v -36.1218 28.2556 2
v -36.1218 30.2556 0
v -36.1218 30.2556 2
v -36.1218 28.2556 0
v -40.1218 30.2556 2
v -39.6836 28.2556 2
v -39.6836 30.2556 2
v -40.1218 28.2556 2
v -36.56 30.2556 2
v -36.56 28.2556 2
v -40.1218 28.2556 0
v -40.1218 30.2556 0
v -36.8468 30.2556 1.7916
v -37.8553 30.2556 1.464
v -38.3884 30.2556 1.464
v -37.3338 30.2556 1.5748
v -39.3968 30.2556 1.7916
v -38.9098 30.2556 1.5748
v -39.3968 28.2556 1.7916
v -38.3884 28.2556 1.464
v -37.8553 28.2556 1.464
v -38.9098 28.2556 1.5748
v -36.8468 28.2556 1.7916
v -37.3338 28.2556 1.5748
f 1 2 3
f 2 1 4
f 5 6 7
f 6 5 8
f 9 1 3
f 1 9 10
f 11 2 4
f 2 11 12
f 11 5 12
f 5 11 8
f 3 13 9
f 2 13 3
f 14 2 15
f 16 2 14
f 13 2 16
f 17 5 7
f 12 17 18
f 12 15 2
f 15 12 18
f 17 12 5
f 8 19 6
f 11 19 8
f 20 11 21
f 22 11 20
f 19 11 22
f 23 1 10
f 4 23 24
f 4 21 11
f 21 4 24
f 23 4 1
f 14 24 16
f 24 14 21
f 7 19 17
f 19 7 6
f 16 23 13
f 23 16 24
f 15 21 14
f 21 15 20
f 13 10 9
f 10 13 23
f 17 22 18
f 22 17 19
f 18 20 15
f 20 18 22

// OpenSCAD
difference () {
  union () {
    translate ([-38.121819219172885, 29.255592233168752, 1]) {
      cube ([4, 2, 2], center=true);
    }
  }
  union () {
    translate ([-38.121819219172885, 30.255592233168752, 4]) {
      rotate (a=90.0, v=[1, 0, 0]) {
        cylinder ($fn=30, h=20, r=2.55, center=true);
      }
    }
    translate ([-38.121819219172885, 28.255592233168752, 2]) {
      cube ([0, 0, 0], center=true);
    }
  }
}
